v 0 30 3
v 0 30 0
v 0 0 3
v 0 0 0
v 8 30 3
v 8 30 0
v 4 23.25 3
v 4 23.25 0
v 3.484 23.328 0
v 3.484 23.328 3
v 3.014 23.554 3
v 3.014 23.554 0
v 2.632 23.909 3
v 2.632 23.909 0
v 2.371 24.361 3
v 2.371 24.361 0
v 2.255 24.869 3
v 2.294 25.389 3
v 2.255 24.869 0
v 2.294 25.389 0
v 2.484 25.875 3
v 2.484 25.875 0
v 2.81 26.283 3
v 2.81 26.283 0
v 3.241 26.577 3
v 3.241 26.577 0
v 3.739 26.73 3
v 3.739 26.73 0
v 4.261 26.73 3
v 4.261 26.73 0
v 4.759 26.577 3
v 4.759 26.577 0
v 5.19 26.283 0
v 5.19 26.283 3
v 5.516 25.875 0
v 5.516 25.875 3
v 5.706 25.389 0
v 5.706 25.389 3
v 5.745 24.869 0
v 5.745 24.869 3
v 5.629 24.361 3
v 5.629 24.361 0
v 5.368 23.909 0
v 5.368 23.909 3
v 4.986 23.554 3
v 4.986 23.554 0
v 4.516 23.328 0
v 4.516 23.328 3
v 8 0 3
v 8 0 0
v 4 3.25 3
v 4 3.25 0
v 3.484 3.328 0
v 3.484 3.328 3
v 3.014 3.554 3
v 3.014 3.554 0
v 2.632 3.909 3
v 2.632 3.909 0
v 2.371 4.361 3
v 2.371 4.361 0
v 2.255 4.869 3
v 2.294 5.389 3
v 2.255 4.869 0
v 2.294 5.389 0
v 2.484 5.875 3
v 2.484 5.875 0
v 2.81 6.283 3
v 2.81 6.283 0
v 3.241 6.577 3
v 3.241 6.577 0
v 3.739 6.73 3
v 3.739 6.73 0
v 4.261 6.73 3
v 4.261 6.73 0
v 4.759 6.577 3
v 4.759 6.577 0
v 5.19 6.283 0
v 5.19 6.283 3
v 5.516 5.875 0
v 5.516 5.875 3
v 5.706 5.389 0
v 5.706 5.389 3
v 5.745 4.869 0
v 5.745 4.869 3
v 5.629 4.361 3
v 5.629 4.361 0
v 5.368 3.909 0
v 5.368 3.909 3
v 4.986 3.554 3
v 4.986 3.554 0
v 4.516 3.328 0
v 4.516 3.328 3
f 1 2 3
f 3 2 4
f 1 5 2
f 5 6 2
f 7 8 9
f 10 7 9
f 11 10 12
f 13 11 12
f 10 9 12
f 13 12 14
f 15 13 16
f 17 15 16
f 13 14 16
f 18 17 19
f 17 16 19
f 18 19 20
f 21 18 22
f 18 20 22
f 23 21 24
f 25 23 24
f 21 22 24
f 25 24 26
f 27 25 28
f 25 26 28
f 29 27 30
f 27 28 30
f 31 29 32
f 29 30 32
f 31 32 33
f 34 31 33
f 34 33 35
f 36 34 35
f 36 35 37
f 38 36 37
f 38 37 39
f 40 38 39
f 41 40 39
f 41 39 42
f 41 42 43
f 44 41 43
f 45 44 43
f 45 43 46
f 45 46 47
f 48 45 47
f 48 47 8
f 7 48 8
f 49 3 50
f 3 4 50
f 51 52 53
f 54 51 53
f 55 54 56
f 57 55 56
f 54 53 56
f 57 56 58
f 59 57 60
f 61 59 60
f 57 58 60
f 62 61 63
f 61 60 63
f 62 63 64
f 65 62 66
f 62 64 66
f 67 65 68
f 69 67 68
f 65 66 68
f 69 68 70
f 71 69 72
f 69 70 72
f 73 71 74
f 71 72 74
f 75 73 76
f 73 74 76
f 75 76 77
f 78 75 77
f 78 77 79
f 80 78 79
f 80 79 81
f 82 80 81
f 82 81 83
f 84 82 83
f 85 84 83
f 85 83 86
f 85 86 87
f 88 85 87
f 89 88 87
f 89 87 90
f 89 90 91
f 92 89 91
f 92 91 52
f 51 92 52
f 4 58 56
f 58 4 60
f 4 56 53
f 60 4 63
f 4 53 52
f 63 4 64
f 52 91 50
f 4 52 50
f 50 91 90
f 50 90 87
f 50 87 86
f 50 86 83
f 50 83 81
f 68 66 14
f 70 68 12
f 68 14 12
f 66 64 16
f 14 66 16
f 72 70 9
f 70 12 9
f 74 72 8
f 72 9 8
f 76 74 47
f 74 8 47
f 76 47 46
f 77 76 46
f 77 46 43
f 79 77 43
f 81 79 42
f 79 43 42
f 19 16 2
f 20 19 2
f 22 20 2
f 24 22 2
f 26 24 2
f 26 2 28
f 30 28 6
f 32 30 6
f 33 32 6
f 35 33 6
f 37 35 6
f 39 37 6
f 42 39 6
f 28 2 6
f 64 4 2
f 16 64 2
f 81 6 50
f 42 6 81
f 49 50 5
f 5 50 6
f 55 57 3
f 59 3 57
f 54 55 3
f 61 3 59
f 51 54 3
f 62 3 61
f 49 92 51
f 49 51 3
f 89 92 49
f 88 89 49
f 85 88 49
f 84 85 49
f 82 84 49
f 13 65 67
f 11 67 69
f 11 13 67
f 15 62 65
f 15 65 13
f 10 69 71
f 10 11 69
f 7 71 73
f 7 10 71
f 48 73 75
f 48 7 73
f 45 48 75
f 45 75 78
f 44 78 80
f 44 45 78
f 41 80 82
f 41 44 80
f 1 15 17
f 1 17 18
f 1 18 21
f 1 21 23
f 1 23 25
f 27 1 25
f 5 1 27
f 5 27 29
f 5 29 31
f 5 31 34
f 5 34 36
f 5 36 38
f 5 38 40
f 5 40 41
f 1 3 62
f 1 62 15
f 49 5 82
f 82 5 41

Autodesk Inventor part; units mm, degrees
ref_plane "YZ Plane" through (0, 0, 0) normal (1, 0, 0) x (0, 1, 0)
ref_plane "XZ Plane" through (0, 0, 0) normal (0, 1, 0) x (-1, 0, 0)
ref_plane "XY Plane" through (0, 0, 0) normal (0, 0, 1) x (1, 0, 0)
sketch "スケッチ1" plane through (0, 0, 0) normal (0, 0, 1) x (1, 0, 0)
  line L0 (0, 0) -> (8, 0)
  line L1 (8, 0) -> (8, 30)
  line L2 (8, 30) -> (0, 30)
  line L3 (0, 30) -> (0, 0)
  dimension "d0" = 8
  dimension "d1" = 30
extrude "押し出し1" add sketch "スケッチ1" along normal blind 3
sketch "スケッチ2" plane through (0, 0, 3) normal (0, 0, 1) x (1, 0, 0)
  line L0 (8, 0) -> (8, 30) projected
  line L1 (8, 30) -> (0, 30) projected
  line L2 (0, 0) -> (8, 0) projected
  point P0 (4, 25)
  point P1 (4, 5)
  dimension "d4" = 4
  dimension "d5" = 5
  dimension "d6" = 5
  dimension "d7" = 4
hole "穴1" at (4, 25, 3) at (4, 5, 3) direction (0, 0, -1) diameter 3.5 end through all
properties part number "3SR14_ポテンショメータ固定台"
